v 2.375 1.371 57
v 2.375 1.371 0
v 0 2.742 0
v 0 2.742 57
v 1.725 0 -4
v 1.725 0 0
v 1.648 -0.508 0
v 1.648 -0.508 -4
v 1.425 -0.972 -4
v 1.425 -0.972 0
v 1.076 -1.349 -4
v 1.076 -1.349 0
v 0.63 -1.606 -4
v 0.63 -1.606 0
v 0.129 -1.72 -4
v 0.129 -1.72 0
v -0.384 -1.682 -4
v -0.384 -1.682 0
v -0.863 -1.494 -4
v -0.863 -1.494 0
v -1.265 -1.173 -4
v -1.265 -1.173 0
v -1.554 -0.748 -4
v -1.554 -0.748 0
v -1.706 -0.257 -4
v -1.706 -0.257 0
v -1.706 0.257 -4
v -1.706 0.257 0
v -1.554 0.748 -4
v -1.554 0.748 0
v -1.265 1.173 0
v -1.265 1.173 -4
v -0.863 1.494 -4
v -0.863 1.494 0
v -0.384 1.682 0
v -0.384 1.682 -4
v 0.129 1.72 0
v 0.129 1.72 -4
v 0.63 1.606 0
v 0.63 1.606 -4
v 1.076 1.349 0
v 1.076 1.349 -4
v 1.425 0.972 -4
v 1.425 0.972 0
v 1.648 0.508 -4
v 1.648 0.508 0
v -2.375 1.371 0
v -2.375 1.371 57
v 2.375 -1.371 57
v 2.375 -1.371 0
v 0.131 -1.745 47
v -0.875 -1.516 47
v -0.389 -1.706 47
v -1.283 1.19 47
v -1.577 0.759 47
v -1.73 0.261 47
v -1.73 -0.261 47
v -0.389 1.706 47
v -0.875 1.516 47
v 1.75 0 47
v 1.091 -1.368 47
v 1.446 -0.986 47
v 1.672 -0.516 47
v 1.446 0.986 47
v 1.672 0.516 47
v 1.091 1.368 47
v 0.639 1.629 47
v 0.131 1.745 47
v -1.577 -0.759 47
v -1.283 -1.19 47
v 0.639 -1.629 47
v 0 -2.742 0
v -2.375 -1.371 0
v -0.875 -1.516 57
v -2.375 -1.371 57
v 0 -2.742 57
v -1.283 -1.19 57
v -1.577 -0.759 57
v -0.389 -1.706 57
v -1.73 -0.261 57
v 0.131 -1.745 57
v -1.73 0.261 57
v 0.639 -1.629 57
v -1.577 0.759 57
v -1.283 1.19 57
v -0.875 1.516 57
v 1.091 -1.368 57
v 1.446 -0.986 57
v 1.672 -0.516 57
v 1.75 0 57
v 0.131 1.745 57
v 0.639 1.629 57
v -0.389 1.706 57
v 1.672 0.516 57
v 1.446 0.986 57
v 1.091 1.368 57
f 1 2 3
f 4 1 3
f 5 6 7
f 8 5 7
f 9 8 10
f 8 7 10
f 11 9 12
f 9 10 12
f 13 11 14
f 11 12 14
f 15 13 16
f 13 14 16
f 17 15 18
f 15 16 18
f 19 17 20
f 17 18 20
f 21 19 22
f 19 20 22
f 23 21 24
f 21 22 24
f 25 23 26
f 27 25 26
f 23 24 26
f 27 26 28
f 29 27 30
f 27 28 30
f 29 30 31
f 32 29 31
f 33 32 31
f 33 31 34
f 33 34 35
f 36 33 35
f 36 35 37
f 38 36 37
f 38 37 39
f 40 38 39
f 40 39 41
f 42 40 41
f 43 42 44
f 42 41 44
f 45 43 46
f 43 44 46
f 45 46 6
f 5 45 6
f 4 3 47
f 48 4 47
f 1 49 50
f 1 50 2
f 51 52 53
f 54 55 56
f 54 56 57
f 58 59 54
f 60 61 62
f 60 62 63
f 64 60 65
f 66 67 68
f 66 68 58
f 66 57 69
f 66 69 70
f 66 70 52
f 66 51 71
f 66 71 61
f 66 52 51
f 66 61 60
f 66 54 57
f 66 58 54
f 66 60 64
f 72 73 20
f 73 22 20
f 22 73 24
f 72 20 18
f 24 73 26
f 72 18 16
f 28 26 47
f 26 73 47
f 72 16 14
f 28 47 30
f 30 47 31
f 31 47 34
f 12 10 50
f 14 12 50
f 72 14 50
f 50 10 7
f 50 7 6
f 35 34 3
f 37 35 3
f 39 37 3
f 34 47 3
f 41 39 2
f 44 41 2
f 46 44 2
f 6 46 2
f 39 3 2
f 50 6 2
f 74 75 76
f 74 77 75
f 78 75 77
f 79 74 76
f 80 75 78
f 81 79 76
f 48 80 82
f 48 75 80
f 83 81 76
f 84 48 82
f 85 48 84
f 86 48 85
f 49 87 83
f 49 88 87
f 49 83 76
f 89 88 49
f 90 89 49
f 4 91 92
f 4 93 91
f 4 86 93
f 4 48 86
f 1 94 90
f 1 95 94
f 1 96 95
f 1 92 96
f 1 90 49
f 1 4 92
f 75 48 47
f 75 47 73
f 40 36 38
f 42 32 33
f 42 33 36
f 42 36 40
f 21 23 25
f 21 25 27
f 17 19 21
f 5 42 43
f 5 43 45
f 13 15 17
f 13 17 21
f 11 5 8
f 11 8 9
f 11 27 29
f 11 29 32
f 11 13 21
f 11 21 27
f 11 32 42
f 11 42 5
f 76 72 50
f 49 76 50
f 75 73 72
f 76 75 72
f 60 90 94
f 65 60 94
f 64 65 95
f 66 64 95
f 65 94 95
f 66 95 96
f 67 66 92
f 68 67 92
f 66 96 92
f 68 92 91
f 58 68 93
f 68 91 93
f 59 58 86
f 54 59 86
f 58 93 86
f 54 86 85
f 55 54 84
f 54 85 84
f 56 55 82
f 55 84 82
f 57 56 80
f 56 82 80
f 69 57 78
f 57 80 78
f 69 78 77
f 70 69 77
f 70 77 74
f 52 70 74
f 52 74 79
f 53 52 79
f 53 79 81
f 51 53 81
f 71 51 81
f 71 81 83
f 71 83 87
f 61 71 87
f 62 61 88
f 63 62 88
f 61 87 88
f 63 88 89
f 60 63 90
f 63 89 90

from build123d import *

# Parameters (mm, degrees)
F1_DEPTH = 57
F2_R     = 1.75
F3_DEPTH = 10
F4_R     = 1.725
F5_DEPTH = 4


with BuildPart() as f1:
    # F0 (on Top) → F1 (new body)
    with BuildSketch(Plane.XY):
        Polygon((2.375, 1.371207), (0, 2.742414), (-2.375, 1.371207), (-2.375, -1.371207), (0, -2.742414), (2.375, -1.371207), align=None)
    extrude(amount=F1_DEPTH)

    # F2 (on face) → F3 (cut)
    with BuildSketch(Plane.XY.offset(57)):
        Circle(F2_R)
    extrude(amount=-F3_DEPTH, mode=Mode.SUBTRACT)

    # F4 (on face) → F5 (join)
    with BuildSketch(Plane(origin=(0, 0, 0), x_dir=(1, 0, 0), z_dir=(0, 0, -1))):
        Circle(F4_R)
    extrude(amount=F5_DEPTH)


solid = f1.part
